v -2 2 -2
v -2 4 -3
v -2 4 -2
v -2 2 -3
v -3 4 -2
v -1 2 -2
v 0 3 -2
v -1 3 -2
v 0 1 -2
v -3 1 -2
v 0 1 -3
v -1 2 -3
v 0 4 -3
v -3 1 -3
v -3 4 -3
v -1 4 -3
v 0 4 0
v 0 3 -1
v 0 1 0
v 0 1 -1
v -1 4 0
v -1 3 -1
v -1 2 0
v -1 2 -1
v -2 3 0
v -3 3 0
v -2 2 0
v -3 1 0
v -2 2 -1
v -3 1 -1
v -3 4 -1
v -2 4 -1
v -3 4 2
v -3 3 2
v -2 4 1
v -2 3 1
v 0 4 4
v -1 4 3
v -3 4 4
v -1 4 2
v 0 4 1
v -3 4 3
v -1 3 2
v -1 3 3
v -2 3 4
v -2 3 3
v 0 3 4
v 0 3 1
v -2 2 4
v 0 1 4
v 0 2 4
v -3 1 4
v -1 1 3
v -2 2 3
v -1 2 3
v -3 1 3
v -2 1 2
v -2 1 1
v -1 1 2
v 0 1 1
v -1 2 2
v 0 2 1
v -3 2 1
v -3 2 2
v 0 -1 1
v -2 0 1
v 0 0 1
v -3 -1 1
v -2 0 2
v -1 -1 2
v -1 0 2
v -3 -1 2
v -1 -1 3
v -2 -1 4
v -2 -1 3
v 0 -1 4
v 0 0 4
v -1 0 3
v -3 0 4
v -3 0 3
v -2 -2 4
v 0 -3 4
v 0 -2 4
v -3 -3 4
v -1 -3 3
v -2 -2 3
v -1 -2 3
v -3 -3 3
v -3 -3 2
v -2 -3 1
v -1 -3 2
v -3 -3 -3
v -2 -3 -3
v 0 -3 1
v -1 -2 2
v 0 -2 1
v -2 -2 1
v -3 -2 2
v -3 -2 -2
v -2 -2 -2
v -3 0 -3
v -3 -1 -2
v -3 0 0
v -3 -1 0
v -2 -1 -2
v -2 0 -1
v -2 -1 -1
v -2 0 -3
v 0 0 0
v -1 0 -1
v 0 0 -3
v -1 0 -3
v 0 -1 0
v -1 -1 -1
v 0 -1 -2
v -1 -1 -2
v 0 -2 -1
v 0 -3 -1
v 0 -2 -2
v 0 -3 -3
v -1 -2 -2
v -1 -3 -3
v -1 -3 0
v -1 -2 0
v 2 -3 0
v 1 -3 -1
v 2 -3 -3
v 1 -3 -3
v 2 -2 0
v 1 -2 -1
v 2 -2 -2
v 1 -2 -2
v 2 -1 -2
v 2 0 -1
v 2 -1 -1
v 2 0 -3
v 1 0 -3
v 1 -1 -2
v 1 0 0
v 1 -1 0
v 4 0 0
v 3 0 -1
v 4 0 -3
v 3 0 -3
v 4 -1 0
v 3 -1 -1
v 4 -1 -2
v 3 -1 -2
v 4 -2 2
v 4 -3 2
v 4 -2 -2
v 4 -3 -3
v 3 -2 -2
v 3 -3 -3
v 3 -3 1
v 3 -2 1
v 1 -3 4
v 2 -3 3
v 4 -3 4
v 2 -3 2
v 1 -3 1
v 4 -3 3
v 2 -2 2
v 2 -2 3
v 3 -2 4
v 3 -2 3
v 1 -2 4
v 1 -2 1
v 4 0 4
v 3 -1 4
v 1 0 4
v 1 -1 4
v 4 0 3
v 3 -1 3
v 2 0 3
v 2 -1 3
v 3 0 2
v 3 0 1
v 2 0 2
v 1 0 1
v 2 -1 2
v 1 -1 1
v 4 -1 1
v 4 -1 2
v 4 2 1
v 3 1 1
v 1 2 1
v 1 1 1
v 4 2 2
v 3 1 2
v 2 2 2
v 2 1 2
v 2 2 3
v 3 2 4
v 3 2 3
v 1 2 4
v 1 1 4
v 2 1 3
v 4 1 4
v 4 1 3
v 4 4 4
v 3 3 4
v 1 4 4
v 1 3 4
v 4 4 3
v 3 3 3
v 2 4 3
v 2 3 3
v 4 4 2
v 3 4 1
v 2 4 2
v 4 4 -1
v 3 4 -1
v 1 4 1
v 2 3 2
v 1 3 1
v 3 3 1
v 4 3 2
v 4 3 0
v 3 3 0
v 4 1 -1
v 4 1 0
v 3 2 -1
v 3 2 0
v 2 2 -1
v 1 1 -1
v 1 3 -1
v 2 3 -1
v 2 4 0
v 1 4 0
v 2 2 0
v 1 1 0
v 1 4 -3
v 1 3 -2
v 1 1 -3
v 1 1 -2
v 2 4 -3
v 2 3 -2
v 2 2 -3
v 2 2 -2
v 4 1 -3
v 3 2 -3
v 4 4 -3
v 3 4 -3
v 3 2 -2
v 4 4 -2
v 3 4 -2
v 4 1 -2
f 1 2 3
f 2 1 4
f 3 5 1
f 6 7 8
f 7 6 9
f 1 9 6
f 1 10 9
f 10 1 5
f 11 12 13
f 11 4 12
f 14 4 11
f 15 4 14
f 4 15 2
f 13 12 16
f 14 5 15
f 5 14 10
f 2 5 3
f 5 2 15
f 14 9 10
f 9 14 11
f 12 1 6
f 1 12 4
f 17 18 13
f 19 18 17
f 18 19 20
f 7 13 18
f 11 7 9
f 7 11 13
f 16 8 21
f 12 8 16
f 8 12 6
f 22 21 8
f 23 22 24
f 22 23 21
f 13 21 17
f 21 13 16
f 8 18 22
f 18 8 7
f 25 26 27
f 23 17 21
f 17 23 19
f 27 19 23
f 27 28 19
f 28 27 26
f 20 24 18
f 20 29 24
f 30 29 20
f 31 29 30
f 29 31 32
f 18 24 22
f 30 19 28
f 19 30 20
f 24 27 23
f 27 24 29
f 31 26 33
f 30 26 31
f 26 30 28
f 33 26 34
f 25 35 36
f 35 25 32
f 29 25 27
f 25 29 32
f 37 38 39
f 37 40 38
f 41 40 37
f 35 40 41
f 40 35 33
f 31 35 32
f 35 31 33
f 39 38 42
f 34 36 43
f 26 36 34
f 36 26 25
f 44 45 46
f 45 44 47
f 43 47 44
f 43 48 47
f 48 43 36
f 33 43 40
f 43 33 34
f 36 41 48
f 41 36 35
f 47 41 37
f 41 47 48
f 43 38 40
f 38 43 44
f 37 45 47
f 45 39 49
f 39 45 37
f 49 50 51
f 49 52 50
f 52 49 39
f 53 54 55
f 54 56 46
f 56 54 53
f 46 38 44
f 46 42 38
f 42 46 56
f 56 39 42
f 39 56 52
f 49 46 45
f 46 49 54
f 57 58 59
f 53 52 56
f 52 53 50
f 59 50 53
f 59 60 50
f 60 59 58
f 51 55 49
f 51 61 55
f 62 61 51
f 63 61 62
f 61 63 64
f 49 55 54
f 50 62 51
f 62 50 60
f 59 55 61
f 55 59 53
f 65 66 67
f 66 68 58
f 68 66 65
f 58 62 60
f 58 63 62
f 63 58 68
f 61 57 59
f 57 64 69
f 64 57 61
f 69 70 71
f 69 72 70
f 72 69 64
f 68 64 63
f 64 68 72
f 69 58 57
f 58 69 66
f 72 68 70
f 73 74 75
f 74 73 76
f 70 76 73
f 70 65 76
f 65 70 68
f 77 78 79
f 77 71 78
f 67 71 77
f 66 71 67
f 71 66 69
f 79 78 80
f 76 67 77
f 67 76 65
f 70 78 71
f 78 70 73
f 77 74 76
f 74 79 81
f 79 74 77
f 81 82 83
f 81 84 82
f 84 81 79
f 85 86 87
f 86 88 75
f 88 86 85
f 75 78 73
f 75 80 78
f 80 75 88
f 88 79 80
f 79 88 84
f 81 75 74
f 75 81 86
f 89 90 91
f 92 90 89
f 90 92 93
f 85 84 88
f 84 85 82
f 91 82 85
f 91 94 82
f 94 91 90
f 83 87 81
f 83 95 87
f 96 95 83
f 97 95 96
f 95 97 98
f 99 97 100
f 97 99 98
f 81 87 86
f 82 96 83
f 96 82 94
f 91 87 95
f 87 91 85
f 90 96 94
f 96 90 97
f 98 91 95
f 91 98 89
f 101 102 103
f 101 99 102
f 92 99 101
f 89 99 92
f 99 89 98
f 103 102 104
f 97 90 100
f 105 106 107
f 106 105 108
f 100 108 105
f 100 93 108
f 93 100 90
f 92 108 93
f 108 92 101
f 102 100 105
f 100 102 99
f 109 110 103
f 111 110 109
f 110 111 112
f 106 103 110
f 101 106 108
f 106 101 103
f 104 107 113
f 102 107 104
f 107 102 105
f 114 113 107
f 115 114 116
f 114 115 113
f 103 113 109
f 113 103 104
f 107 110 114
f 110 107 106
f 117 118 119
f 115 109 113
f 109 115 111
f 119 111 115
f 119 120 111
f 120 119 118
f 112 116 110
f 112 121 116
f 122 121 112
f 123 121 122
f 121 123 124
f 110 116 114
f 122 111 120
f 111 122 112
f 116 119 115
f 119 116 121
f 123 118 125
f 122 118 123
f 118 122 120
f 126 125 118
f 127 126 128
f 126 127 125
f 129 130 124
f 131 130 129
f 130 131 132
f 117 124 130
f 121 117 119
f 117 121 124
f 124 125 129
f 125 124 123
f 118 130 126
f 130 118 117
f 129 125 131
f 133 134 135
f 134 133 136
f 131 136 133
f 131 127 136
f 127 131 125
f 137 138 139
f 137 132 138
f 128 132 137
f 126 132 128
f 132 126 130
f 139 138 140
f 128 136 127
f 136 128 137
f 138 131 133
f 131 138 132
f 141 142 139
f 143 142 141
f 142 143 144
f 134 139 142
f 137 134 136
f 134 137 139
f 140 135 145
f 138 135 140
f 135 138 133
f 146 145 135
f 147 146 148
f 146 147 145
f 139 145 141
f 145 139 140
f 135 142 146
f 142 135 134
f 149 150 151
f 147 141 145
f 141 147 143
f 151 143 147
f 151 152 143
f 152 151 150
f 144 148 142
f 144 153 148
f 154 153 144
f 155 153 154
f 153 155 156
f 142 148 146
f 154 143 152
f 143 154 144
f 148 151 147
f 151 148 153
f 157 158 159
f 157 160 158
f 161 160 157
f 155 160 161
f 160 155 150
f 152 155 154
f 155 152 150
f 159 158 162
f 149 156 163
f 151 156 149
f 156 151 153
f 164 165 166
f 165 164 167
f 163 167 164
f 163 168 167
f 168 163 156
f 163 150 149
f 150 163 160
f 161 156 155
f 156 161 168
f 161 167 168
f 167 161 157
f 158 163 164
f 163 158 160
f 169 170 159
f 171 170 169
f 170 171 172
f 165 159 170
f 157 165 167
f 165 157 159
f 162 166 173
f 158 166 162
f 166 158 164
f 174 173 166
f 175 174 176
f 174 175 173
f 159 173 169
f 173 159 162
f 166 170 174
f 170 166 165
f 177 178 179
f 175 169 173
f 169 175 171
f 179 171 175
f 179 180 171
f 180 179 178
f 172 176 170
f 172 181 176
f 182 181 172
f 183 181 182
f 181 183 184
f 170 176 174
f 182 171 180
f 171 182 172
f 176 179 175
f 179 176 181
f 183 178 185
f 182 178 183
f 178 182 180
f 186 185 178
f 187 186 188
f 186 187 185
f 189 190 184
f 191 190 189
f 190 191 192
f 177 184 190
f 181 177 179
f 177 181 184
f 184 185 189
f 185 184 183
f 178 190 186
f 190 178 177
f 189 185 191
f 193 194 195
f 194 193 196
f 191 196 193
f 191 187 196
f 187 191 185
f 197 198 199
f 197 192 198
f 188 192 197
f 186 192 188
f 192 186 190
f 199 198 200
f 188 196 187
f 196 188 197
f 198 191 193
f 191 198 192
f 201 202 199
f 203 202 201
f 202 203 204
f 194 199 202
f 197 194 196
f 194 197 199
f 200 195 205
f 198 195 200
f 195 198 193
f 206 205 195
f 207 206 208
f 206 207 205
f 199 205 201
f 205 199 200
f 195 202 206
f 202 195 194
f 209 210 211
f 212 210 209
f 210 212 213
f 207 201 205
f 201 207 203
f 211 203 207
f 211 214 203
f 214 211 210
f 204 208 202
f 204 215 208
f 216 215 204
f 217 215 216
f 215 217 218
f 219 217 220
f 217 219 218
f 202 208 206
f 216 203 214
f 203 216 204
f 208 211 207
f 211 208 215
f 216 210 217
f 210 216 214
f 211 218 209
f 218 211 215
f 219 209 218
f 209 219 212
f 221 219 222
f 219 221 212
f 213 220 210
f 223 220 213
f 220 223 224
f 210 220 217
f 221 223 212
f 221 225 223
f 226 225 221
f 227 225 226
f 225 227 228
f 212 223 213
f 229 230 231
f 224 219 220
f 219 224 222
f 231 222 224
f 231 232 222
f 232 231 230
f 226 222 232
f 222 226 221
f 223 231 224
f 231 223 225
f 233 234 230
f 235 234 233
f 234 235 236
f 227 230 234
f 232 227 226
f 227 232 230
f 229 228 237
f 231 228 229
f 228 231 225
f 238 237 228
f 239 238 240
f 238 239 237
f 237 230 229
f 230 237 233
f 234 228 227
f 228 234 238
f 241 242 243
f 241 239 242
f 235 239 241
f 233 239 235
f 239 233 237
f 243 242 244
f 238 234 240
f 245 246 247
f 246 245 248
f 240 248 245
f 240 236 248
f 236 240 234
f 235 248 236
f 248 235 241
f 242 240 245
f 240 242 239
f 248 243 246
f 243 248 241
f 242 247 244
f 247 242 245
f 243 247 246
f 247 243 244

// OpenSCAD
//Script adapted from http://thomasdiewald.com/blog/?p=561

/* [Main Parameters] */
//May increase processing time
Iterations = 1;//[0:3]

//How far apart the beams are
Spacing = 5;//[3:Extra Tight,4: Tight,5:Normal,7:Wide,10:Extra Wide,15:Extremely Wide]

//% Realative to corners
beam_width = 100;//[1:100]

/* [Randomization] */

//Ignore Main Parameters and randomize. The final model may be different from the preview.
randomized = 0;//[0:No,1:Yes]

minimum_iterations = 0;//[0:3]
maximum_iterations = 3;//[0:3]

minimum_spacing = 3;//[3:Extra Tight,4: Tight,5:Normal,7:Wide,10:Extra Wide,15:Extremely Wide]
maximum_spacing = 10;//[3:Extra Tight,4: Tight,5:Normal,7:Wide,10:Extra Wide,15:Extremely Wide]

minimum_beam_width = 10;//[1:100]
maximum_beam_width = 100;//[1:100]

/* [Hidden] */
if(randomized == 0) //Execute normally if not randomized
drawhilbert(Spacing, Iterations, beam_width);

if(randomized == 1) //Randomize Paramaters
    drawhilbert(rands(minimum_spacing,maximum_spacing,1)[0],floor(rands(minimum_iterations,maximum_iterations + 1,1)[0]),rands(minimum_beam_width,maximum_beam_width,1)[0]);

module drawhilbert(spacing, iterations, beam_width){
flatmult = pow(2,iterations+1);//Used in flatten function
    
size = pow(2,iterations) * spacing/5;//Used for consistent spacing
    
nums = flatten(hilbert(size = size, iterations = iterations),flatmult);//Generates flat array of numbers
    
beam_offset = [1-beam_width/100,1-beam_width/100,1-beam_width/100];//Generates beam offset
    
cubes= [for(a = [0:len(nums)-1]) if(a %3 == 0) [nums[a],nums[a+1],nums[a+2]]];//Changes flat array into array of cube vectors
    
for(a = [0:len(cubes)-2]){
    line(cube1=cubes[a],cube2=cubes[a+1],beam_width = beam_width,beam_offset = beam_offset);
    }//Goes through vector and renders cubes
}
function hilbert(center = [0,0,0], size, iterations, a=0,b=1,c=2,d=3,e=4,f=5,g=6,h=7)=(iterations >= 0)?
     //Recursive logic   
       
        [[hilbert(corner(a,center, size), size*.5, iterations - 1, a,d,e,h,g,f,c,b)],
        [hilbert(corner(b,center, size),size*.5, iterations - 1,a,h,g,b,c,f,e,d)],
        [hilbert(corner(c,center, size),size*.5, iterations - 1,a,h,g,b,c,f,e,d)],
        [hilbert(corner(d,center, size),size*.5, iterations - 1,c,d,a,b,g,h,e,f)],
        [hilbert(corner(e,center, size),size*.5, iterations - 1,c,d,a,b,g,h,e,f)],
        [hilbert(corner(f,center, size),size*.5, iterations - 1,e,d,c,f,g,b,a,h)],
        [hilbert(corner(g,center, size),size*.5, iterations - 1,e,d,c,f,g,b,a,h)],
        [hilbert(corner(h,center, size),size*.5, iterations - 1,g,f,c,b,a,d,e,h)]]:center
    ;

function corner(cnr, center, size) = (cnr == 0)?[center[0] - size,center[1] + size,center[2] - size]:
(cnr == 1)?[center[0] - size,center[1] + size,center[2] + size]:
(cnr == 2)?[center[0] - size,center[1] - size,center[2] + size]:
(cnr == 3)?[center[0] - size,center[1] - size,center[2] - size]:
(cnr == 4)?[center[0] + size,center[1] - size,center[2] - size]:
(cnr == 5)?[center[0] + size,center[1] - size,center[2] + size]:
(cnr == 6)?[center[0] + size,center[1] + size,center[2] + size]:
[center[0] + size,center[1] + size,center[2] - size];//Gets corner value from index, because functions cannot generate an array of corners
    


function flatten(l,i)=(i>0)? flatten([for(a=l) for(b = a) b],i-1):l;//Flattens arrays through recursion


 module line(cube1,cube2,beam_width,beam_offset){//Actual rendering
     translate(cube1)cube(1);//Generates corners
        translate(cube2)cube(1);
    hull(){//Generates beams
        translate(cube1+(beam_offset/2))cube(beam_width/100);
        translate(cube2+(beam_offset/2))cube(beam_width/100);}
}
  
